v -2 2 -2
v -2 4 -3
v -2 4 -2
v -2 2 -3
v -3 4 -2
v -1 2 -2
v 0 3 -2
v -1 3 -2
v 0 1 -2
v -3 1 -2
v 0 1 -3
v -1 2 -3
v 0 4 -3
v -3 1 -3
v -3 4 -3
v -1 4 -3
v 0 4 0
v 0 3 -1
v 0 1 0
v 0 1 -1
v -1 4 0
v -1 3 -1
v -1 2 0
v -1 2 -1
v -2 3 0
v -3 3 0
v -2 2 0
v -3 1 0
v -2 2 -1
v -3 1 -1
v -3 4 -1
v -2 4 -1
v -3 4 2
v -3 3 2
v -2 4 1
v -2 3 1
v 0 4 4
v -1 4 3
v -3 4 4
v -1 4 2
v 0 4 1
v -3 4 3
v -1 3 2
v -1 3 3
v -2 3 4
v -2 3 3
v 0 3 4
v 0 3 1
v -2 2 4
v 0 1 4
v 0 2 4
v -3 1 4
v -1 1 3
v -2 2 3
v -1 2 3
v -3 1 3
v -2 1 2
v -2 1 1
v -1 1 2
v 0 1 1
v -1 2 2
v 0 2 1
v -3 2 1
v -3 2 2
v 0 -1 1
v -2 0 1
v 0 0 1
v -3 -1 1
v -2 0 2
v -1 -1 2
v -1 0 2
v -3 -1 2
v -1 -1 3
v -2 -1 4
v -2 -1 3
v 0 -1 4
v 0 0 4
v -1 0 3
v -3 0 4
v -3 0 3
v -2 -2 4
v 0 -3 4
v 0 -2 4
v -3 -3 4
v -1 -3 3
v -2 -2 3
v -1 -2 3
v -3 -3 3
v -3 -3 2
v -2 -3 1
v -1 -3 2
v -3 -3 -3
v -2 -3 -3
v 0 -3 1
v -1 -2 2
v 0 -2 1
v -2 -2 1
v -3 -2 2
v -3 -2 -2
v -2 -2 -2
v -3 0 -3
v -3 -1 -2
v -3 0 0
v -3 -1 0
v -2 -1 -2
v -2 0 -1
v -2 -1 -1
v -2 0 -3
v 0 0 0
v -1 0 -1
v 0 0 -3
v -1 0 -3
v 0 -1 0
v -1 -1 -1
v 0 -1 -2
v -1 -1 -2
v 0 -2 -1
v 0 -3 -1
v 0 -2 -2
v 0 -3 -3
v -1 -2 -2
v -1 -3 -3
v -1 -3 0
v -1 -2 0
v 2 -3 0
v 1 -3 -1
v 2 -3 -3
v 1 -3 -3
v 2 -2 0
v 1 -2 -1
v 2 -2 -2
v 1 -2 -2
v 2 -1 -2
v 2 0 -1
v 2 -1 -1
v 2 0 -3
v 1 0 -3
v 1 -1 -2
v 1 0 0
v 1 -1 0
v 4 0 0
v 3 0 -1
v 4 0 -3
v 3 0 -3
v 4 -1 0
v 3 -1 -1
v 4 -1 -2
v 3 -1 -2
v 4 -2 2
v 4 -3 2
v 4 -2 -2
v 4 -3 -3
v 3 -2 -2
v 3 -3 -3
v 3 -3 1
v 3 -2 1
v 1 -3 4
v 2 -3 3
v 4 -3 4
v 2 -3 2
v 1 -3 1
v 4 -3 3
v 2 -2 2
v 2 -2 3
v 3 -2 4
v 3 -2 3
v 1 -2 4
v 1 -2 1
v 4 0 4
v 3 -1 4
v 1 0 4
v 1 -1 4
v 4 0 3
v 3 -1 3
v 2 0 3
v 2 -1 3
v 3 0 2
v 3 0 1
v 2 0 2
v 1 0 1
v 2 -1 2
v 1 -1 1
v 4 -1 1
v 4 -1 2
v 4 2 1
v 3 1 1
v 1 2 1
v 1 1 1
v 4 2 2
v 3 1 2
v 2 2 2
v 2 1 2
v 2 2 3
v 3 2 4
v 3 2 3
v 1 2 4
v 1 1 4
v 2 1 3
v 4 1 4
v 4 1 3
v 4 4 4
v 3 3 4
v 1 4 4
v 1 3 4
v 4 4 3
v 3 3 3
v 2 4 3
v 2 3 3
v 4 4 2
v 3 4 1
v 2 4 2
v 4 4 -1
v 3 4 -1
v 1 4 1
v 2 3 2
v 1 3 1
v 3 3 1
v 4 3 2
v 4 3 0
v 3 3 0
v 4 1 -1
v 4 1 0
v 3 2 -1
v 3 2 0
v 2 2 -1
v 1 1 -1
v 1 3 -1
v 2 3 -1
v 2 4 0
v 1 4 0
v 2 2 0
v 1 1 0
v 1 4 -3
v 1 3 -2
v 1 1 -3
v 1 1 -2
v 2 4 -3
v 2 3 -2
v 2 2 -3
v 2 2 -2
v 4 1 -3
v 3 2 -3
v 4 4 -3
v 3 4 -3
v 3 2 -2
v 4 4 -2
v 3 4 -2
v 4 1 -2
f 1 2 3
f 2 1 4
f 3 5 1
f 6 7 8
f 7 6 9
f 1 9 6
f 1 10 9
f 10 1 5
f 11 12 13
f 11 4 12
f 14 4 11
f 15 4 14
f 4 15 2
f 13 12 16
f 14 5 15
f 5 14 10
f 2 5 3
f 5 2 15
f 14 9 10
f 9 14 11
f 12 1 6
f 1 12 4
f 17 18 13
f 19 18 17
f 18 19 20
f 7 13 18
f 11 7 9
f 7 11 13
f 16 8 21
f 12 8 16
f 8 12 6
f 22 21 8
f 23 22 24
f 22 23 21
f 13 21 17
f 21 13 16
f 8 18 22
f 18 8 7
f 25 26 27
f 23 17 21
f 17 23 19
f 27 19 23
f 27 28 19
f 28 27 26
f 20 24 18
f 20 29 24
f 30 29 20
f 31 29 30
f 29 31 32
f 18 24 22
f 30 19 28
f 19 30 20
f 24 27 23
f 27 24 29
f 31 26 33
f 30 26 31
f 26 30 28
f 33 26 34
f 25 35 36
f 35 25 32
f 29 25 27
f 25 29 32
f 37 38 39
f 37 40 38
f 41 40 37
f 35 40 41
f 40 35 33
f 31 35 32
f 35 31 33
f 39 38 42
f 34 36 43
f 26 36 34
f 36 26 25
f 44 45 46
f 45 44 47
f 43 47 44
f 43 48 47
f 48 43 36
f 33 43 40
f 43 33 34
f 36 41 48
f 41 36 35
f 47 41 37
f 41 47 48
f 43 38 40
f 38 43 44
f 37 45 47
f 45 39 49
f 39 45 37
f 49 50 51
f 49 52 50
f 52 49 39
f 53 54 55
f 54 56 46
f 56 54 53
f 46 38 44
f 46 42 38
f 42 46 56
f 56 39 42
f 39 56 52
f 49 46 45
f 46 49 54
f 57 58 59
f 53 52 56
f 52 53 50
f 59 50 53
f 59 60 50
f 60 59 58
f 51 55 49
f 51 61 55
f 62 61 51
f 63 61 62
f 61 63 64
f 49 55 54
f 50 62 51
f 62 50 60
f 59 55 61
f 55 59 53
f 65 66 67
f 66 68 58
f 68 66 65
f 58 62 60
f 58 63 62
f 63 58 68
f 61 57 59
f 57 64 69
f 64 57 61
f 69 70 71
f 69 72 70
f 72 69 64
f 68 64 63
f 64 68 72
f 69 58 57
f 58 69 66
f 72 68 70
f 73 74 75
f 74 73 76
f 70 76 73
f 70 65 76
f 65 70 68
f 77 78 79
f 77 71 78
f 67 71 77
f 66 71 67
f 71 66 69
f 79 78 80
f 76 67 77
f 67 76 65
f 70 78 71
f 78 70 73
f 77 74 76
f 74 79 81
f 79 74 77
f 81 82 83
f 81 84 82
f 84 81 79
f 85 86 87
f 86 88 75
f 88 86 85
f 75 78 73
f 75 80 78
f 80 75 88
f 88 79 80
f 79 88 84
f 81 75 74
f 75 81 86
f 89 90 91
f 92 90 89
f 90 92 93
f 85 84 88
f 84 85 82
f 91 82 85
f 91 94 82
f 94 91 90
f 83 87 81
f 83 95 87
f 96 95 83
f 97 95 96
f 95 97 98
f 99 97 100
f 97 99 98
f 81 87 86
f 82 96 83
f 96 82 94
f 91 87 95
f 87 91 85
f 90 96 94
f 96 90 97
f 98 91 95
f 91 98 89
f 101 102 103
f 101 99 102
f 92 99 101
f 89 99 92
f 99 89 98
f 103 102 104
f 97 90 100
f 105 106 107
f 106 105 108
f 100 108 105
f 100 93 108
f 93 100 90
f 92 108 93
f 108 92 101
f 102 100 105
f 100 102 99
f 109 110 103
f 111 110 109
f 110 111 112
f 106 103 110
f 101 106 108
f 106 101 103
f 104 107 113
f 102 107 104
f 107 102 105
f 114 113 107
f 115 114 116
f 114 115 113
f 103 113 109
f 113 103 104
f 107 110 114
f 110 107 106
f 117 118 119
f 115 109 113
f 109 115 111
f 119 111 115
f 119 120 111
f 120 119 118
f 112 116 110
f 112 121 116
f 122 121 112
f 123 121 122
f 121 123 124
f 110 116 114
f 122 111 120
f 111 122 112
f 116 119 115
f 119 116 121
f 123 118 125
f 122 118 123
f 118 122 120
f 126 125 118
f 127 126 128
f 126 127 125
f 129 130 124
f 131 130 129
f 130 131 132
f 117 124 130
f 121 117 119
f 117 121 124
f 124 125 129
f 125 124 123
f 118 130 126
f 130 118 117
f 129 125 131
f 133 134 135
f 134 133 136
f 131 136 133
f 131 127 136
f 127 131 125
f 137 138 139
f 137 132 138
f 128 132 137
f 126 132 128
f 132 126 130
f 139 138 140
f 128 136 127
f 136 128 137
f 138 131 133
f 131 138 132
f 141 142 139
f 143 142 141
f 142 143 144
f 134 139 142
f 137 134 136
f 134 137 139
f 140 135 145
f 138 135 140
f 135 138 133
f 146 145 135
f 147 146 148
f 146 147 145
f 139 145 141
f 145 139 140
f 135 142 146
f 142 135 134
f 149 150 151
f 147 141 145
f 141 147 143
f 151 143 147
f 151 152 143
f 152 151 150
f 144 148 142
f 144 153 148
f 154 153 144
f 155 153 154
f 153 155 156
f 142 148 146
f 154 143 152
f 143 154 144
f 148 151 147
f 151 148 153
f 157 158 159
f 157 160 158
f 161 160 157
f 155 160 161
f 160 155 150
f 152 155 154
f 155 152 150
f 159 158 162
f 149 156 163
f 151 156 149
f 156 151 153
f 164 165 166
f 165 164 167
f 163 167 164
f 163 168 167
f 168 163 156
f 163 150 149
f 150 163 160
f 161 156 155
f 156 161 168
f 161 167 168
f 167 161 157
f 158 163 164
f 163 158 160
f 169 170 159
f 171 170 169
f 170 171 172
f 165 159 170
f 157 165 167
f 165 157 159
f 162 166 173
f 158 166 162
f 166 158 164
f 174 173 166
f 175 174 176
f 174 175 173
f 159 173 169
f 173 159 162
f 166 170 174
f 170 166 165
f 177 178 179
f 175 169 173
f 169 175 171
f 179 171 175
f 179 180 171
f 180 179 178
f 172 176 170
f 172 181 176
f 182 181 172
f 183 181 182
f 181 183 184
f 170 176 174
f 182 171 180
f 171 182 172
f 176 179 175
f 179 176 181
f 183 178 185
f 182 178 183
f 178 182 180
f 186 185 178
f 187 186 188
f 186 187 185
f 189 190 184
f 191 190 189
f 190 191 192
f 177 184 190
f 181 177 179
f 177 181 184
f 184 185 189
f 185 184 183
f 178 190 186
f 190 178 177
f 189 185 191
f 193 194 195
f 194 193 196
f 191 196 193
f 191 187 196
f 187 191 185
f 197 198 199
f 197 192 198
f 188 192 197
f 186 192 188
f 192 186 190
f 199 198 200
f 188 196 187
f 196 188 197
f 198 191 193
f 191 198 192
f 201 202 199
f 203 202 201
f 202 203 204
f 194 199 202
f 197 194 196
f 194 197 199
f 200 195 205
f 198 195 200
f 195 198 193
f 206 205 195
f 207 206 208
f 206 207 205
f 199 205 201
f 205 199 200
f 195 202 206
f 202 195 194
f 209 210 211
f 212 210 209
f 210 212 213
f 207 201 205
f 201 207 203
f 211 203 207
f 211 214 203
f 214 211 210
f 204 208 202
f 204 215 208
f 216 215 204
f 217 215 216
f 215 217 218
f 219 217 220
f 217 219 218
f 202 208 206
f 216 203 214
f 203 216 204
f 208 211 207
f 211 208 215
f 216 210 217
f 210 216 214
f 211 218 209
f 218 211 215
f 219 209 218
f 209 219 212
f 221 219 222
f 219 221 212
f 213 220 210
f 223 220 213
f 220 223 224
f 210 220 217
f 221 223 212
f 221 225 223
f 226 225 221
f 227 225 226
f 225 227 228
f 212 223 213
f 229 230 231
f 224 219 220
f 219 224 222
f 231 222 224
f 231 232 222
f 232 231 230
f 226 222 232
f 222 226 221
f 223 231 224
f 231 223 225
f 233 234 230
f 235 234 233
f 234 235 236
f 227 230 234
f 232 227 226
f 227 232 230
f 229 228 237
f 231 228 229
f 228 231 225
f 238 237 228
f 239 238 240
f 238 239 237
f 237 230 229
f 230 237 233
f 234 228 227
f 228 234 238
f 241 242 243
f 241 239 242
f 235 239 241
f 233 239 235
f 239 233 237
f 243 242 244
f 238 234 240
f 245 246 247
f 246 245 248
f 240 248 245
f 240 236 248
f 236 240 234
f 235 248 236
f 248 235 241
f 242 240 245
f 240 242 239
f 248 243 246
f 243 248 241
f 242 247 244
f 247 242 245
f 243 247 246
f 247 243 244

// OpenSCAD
//Script adapted from http://thomasdiewald.com/blog/?p=561

/* [Main Parameters] */
//May increase processing time
Iterations = 1;//[0:3]

//How far apart the beams are
Spacing = 5;//[3:Extra Tight,4: Tight,5:Normal,7:Wide,10:Extra Wide,15:Extremely Wide]

//% Realative to corners
beam_width = 100;//[1:100]

/* [Randomization] */

//Ignore Main Parameters and randomize. The final model may be different from the preview.
randomized = 0;//[0:No,1:Yes]

minimum_iterations = 0;//[0:3]
maximum_iterations = 3;//[0:3]

minimum_spacing = 3;//[3:Extra Tight,4: Tight,5:Normal,7:Wide,10:Extra Wide,15:Extremely Wide]
maximum_spacing = 10;//[3:Extra Tight,4: Tight,5:Normal,7:Wide,10:Extra Wide,15:Extremely Wide]

minimum_beam_width = 10;//[1:100]
maximum_beam_width = 100;//[1:100]

/* [Hidden] */
if(randomized == 0) //Execute normally if not randomized
drawhilbert(Spacing, Iterations, beam_width);

if(randomized == 1) //Randomize Paramaters
    drawhilbert(rands(minimum_spacing,maximum_spacing,1)[0],floor(rands(minimum_iterations,maximum_iterations + 1,1)[0]),rands(minimum_beam_width,maximum_beam_width,1)[0]);

module drawhilbert(spacing, iterations, beam_width){
flatmult = pow(2,iterations+1);//Used in flatten function
    
size = pow(2,iterations) * spacing/5;//Used for consistent spacing
    
nums = flatten(hilbert(size = size, iterations = iterations),flatmult);//Generates flat array of numbers
    
beam_offset = [1-beam_width/100,1-beam_width/100,1-beam_width/100];//Generates beam offset
    
cubes= [for(a = [0:len(nums)-1]) if(a %3 == 0) [nums[a],nums[a+1],nums[a+2]]];//Changes flat array into array of cube vectors
    
for(a = [0:len(cubes)-2]){
    line(cube1=cubes[a],cube2=cubes[a+1],beam_width = beam_width,beam_offset = beam_offset);
    }//Goes through vector and renders cubes
}
function hilbert(center = [0,0,0], size, iterations, a=0,b=1,c=2,d=3,e=4,f=5,g=6,h=7)=(iterations >= 0)?
     //Recursive logic   
       
        [[hilbert(corner(a,center, size), size*.5, iterations - 1, a,d,e,h,g,f,c,b)],
        [hilbert(corner(b,center, size),size*.5, iterations - 1,a,h,g,b,c,f,e,d)],
        [hilbert(corner(c,center, size),size*.5, iterations - 1,a,h,g,b,c,f,e,d)],
        [hilbert(corner(d,center, size),size*.5, iterations - 1,c,d,a,b,g,h,e,f)],
        [hilbert(corner(e,center, size),size*.5, iterations - 1,c,d,a,b,g,h,e,f)],
        [hilbert(corner(f,center, size),size*.5, iterations - 1,e,d,c,f,g,b,a,h)],
        [hilbert(corner(g,center, size),size*.5, iterations - 1,e,d,c,f,g,b,a,h)],
        [hilbert(corner(h,center, size),size*.5, iterations - 1,g,f,c,b,a,d,e,h)]]:center
    ;

function corner(cnr, center, size) = (cnr == 0)?[center[0] - size,center[1] + size,center[2] - size]:
(cnr == 1)?[center[0] - size,center[1] + size,center[2] + size]:
(cnr == 2)?[center[0] - size,center[1] - size,center[2] + size]:
(cnr == 3)?[center[0] - size,center[1] - size,center[2] - size]:
(cnr == 4)?[center[0] + size,center[1] - size,center[2] - size]:
(cnr == 5)?[center[0] + size,center[1] - size,center[2] + size]:
(cnr == 6)?[center[0] + size,center[1] + size,center[2] + size]:
[center[0] + size,center[1] + size,center[2] - size];//Gets corner value from index, because functions cannot generate an array of corners
    


function flatten(l,i)=(i>0)? flatten([for(a=l) for(b = a) b],i-1):l;//Flattens arrays through recursion


 module line(cube1,cube2,beam_width,beam_offset){//Actual rendering
     translate(cube1)cube(1);//Generates corners
        translate(cube2)cube(1);
    hull(){//Generates beams
        translate(cube1+(beam_offset/2))cube(beam_width/100);
        translate(cube2+(beam_offset/2))cube(beam_width/100);}
}
  
